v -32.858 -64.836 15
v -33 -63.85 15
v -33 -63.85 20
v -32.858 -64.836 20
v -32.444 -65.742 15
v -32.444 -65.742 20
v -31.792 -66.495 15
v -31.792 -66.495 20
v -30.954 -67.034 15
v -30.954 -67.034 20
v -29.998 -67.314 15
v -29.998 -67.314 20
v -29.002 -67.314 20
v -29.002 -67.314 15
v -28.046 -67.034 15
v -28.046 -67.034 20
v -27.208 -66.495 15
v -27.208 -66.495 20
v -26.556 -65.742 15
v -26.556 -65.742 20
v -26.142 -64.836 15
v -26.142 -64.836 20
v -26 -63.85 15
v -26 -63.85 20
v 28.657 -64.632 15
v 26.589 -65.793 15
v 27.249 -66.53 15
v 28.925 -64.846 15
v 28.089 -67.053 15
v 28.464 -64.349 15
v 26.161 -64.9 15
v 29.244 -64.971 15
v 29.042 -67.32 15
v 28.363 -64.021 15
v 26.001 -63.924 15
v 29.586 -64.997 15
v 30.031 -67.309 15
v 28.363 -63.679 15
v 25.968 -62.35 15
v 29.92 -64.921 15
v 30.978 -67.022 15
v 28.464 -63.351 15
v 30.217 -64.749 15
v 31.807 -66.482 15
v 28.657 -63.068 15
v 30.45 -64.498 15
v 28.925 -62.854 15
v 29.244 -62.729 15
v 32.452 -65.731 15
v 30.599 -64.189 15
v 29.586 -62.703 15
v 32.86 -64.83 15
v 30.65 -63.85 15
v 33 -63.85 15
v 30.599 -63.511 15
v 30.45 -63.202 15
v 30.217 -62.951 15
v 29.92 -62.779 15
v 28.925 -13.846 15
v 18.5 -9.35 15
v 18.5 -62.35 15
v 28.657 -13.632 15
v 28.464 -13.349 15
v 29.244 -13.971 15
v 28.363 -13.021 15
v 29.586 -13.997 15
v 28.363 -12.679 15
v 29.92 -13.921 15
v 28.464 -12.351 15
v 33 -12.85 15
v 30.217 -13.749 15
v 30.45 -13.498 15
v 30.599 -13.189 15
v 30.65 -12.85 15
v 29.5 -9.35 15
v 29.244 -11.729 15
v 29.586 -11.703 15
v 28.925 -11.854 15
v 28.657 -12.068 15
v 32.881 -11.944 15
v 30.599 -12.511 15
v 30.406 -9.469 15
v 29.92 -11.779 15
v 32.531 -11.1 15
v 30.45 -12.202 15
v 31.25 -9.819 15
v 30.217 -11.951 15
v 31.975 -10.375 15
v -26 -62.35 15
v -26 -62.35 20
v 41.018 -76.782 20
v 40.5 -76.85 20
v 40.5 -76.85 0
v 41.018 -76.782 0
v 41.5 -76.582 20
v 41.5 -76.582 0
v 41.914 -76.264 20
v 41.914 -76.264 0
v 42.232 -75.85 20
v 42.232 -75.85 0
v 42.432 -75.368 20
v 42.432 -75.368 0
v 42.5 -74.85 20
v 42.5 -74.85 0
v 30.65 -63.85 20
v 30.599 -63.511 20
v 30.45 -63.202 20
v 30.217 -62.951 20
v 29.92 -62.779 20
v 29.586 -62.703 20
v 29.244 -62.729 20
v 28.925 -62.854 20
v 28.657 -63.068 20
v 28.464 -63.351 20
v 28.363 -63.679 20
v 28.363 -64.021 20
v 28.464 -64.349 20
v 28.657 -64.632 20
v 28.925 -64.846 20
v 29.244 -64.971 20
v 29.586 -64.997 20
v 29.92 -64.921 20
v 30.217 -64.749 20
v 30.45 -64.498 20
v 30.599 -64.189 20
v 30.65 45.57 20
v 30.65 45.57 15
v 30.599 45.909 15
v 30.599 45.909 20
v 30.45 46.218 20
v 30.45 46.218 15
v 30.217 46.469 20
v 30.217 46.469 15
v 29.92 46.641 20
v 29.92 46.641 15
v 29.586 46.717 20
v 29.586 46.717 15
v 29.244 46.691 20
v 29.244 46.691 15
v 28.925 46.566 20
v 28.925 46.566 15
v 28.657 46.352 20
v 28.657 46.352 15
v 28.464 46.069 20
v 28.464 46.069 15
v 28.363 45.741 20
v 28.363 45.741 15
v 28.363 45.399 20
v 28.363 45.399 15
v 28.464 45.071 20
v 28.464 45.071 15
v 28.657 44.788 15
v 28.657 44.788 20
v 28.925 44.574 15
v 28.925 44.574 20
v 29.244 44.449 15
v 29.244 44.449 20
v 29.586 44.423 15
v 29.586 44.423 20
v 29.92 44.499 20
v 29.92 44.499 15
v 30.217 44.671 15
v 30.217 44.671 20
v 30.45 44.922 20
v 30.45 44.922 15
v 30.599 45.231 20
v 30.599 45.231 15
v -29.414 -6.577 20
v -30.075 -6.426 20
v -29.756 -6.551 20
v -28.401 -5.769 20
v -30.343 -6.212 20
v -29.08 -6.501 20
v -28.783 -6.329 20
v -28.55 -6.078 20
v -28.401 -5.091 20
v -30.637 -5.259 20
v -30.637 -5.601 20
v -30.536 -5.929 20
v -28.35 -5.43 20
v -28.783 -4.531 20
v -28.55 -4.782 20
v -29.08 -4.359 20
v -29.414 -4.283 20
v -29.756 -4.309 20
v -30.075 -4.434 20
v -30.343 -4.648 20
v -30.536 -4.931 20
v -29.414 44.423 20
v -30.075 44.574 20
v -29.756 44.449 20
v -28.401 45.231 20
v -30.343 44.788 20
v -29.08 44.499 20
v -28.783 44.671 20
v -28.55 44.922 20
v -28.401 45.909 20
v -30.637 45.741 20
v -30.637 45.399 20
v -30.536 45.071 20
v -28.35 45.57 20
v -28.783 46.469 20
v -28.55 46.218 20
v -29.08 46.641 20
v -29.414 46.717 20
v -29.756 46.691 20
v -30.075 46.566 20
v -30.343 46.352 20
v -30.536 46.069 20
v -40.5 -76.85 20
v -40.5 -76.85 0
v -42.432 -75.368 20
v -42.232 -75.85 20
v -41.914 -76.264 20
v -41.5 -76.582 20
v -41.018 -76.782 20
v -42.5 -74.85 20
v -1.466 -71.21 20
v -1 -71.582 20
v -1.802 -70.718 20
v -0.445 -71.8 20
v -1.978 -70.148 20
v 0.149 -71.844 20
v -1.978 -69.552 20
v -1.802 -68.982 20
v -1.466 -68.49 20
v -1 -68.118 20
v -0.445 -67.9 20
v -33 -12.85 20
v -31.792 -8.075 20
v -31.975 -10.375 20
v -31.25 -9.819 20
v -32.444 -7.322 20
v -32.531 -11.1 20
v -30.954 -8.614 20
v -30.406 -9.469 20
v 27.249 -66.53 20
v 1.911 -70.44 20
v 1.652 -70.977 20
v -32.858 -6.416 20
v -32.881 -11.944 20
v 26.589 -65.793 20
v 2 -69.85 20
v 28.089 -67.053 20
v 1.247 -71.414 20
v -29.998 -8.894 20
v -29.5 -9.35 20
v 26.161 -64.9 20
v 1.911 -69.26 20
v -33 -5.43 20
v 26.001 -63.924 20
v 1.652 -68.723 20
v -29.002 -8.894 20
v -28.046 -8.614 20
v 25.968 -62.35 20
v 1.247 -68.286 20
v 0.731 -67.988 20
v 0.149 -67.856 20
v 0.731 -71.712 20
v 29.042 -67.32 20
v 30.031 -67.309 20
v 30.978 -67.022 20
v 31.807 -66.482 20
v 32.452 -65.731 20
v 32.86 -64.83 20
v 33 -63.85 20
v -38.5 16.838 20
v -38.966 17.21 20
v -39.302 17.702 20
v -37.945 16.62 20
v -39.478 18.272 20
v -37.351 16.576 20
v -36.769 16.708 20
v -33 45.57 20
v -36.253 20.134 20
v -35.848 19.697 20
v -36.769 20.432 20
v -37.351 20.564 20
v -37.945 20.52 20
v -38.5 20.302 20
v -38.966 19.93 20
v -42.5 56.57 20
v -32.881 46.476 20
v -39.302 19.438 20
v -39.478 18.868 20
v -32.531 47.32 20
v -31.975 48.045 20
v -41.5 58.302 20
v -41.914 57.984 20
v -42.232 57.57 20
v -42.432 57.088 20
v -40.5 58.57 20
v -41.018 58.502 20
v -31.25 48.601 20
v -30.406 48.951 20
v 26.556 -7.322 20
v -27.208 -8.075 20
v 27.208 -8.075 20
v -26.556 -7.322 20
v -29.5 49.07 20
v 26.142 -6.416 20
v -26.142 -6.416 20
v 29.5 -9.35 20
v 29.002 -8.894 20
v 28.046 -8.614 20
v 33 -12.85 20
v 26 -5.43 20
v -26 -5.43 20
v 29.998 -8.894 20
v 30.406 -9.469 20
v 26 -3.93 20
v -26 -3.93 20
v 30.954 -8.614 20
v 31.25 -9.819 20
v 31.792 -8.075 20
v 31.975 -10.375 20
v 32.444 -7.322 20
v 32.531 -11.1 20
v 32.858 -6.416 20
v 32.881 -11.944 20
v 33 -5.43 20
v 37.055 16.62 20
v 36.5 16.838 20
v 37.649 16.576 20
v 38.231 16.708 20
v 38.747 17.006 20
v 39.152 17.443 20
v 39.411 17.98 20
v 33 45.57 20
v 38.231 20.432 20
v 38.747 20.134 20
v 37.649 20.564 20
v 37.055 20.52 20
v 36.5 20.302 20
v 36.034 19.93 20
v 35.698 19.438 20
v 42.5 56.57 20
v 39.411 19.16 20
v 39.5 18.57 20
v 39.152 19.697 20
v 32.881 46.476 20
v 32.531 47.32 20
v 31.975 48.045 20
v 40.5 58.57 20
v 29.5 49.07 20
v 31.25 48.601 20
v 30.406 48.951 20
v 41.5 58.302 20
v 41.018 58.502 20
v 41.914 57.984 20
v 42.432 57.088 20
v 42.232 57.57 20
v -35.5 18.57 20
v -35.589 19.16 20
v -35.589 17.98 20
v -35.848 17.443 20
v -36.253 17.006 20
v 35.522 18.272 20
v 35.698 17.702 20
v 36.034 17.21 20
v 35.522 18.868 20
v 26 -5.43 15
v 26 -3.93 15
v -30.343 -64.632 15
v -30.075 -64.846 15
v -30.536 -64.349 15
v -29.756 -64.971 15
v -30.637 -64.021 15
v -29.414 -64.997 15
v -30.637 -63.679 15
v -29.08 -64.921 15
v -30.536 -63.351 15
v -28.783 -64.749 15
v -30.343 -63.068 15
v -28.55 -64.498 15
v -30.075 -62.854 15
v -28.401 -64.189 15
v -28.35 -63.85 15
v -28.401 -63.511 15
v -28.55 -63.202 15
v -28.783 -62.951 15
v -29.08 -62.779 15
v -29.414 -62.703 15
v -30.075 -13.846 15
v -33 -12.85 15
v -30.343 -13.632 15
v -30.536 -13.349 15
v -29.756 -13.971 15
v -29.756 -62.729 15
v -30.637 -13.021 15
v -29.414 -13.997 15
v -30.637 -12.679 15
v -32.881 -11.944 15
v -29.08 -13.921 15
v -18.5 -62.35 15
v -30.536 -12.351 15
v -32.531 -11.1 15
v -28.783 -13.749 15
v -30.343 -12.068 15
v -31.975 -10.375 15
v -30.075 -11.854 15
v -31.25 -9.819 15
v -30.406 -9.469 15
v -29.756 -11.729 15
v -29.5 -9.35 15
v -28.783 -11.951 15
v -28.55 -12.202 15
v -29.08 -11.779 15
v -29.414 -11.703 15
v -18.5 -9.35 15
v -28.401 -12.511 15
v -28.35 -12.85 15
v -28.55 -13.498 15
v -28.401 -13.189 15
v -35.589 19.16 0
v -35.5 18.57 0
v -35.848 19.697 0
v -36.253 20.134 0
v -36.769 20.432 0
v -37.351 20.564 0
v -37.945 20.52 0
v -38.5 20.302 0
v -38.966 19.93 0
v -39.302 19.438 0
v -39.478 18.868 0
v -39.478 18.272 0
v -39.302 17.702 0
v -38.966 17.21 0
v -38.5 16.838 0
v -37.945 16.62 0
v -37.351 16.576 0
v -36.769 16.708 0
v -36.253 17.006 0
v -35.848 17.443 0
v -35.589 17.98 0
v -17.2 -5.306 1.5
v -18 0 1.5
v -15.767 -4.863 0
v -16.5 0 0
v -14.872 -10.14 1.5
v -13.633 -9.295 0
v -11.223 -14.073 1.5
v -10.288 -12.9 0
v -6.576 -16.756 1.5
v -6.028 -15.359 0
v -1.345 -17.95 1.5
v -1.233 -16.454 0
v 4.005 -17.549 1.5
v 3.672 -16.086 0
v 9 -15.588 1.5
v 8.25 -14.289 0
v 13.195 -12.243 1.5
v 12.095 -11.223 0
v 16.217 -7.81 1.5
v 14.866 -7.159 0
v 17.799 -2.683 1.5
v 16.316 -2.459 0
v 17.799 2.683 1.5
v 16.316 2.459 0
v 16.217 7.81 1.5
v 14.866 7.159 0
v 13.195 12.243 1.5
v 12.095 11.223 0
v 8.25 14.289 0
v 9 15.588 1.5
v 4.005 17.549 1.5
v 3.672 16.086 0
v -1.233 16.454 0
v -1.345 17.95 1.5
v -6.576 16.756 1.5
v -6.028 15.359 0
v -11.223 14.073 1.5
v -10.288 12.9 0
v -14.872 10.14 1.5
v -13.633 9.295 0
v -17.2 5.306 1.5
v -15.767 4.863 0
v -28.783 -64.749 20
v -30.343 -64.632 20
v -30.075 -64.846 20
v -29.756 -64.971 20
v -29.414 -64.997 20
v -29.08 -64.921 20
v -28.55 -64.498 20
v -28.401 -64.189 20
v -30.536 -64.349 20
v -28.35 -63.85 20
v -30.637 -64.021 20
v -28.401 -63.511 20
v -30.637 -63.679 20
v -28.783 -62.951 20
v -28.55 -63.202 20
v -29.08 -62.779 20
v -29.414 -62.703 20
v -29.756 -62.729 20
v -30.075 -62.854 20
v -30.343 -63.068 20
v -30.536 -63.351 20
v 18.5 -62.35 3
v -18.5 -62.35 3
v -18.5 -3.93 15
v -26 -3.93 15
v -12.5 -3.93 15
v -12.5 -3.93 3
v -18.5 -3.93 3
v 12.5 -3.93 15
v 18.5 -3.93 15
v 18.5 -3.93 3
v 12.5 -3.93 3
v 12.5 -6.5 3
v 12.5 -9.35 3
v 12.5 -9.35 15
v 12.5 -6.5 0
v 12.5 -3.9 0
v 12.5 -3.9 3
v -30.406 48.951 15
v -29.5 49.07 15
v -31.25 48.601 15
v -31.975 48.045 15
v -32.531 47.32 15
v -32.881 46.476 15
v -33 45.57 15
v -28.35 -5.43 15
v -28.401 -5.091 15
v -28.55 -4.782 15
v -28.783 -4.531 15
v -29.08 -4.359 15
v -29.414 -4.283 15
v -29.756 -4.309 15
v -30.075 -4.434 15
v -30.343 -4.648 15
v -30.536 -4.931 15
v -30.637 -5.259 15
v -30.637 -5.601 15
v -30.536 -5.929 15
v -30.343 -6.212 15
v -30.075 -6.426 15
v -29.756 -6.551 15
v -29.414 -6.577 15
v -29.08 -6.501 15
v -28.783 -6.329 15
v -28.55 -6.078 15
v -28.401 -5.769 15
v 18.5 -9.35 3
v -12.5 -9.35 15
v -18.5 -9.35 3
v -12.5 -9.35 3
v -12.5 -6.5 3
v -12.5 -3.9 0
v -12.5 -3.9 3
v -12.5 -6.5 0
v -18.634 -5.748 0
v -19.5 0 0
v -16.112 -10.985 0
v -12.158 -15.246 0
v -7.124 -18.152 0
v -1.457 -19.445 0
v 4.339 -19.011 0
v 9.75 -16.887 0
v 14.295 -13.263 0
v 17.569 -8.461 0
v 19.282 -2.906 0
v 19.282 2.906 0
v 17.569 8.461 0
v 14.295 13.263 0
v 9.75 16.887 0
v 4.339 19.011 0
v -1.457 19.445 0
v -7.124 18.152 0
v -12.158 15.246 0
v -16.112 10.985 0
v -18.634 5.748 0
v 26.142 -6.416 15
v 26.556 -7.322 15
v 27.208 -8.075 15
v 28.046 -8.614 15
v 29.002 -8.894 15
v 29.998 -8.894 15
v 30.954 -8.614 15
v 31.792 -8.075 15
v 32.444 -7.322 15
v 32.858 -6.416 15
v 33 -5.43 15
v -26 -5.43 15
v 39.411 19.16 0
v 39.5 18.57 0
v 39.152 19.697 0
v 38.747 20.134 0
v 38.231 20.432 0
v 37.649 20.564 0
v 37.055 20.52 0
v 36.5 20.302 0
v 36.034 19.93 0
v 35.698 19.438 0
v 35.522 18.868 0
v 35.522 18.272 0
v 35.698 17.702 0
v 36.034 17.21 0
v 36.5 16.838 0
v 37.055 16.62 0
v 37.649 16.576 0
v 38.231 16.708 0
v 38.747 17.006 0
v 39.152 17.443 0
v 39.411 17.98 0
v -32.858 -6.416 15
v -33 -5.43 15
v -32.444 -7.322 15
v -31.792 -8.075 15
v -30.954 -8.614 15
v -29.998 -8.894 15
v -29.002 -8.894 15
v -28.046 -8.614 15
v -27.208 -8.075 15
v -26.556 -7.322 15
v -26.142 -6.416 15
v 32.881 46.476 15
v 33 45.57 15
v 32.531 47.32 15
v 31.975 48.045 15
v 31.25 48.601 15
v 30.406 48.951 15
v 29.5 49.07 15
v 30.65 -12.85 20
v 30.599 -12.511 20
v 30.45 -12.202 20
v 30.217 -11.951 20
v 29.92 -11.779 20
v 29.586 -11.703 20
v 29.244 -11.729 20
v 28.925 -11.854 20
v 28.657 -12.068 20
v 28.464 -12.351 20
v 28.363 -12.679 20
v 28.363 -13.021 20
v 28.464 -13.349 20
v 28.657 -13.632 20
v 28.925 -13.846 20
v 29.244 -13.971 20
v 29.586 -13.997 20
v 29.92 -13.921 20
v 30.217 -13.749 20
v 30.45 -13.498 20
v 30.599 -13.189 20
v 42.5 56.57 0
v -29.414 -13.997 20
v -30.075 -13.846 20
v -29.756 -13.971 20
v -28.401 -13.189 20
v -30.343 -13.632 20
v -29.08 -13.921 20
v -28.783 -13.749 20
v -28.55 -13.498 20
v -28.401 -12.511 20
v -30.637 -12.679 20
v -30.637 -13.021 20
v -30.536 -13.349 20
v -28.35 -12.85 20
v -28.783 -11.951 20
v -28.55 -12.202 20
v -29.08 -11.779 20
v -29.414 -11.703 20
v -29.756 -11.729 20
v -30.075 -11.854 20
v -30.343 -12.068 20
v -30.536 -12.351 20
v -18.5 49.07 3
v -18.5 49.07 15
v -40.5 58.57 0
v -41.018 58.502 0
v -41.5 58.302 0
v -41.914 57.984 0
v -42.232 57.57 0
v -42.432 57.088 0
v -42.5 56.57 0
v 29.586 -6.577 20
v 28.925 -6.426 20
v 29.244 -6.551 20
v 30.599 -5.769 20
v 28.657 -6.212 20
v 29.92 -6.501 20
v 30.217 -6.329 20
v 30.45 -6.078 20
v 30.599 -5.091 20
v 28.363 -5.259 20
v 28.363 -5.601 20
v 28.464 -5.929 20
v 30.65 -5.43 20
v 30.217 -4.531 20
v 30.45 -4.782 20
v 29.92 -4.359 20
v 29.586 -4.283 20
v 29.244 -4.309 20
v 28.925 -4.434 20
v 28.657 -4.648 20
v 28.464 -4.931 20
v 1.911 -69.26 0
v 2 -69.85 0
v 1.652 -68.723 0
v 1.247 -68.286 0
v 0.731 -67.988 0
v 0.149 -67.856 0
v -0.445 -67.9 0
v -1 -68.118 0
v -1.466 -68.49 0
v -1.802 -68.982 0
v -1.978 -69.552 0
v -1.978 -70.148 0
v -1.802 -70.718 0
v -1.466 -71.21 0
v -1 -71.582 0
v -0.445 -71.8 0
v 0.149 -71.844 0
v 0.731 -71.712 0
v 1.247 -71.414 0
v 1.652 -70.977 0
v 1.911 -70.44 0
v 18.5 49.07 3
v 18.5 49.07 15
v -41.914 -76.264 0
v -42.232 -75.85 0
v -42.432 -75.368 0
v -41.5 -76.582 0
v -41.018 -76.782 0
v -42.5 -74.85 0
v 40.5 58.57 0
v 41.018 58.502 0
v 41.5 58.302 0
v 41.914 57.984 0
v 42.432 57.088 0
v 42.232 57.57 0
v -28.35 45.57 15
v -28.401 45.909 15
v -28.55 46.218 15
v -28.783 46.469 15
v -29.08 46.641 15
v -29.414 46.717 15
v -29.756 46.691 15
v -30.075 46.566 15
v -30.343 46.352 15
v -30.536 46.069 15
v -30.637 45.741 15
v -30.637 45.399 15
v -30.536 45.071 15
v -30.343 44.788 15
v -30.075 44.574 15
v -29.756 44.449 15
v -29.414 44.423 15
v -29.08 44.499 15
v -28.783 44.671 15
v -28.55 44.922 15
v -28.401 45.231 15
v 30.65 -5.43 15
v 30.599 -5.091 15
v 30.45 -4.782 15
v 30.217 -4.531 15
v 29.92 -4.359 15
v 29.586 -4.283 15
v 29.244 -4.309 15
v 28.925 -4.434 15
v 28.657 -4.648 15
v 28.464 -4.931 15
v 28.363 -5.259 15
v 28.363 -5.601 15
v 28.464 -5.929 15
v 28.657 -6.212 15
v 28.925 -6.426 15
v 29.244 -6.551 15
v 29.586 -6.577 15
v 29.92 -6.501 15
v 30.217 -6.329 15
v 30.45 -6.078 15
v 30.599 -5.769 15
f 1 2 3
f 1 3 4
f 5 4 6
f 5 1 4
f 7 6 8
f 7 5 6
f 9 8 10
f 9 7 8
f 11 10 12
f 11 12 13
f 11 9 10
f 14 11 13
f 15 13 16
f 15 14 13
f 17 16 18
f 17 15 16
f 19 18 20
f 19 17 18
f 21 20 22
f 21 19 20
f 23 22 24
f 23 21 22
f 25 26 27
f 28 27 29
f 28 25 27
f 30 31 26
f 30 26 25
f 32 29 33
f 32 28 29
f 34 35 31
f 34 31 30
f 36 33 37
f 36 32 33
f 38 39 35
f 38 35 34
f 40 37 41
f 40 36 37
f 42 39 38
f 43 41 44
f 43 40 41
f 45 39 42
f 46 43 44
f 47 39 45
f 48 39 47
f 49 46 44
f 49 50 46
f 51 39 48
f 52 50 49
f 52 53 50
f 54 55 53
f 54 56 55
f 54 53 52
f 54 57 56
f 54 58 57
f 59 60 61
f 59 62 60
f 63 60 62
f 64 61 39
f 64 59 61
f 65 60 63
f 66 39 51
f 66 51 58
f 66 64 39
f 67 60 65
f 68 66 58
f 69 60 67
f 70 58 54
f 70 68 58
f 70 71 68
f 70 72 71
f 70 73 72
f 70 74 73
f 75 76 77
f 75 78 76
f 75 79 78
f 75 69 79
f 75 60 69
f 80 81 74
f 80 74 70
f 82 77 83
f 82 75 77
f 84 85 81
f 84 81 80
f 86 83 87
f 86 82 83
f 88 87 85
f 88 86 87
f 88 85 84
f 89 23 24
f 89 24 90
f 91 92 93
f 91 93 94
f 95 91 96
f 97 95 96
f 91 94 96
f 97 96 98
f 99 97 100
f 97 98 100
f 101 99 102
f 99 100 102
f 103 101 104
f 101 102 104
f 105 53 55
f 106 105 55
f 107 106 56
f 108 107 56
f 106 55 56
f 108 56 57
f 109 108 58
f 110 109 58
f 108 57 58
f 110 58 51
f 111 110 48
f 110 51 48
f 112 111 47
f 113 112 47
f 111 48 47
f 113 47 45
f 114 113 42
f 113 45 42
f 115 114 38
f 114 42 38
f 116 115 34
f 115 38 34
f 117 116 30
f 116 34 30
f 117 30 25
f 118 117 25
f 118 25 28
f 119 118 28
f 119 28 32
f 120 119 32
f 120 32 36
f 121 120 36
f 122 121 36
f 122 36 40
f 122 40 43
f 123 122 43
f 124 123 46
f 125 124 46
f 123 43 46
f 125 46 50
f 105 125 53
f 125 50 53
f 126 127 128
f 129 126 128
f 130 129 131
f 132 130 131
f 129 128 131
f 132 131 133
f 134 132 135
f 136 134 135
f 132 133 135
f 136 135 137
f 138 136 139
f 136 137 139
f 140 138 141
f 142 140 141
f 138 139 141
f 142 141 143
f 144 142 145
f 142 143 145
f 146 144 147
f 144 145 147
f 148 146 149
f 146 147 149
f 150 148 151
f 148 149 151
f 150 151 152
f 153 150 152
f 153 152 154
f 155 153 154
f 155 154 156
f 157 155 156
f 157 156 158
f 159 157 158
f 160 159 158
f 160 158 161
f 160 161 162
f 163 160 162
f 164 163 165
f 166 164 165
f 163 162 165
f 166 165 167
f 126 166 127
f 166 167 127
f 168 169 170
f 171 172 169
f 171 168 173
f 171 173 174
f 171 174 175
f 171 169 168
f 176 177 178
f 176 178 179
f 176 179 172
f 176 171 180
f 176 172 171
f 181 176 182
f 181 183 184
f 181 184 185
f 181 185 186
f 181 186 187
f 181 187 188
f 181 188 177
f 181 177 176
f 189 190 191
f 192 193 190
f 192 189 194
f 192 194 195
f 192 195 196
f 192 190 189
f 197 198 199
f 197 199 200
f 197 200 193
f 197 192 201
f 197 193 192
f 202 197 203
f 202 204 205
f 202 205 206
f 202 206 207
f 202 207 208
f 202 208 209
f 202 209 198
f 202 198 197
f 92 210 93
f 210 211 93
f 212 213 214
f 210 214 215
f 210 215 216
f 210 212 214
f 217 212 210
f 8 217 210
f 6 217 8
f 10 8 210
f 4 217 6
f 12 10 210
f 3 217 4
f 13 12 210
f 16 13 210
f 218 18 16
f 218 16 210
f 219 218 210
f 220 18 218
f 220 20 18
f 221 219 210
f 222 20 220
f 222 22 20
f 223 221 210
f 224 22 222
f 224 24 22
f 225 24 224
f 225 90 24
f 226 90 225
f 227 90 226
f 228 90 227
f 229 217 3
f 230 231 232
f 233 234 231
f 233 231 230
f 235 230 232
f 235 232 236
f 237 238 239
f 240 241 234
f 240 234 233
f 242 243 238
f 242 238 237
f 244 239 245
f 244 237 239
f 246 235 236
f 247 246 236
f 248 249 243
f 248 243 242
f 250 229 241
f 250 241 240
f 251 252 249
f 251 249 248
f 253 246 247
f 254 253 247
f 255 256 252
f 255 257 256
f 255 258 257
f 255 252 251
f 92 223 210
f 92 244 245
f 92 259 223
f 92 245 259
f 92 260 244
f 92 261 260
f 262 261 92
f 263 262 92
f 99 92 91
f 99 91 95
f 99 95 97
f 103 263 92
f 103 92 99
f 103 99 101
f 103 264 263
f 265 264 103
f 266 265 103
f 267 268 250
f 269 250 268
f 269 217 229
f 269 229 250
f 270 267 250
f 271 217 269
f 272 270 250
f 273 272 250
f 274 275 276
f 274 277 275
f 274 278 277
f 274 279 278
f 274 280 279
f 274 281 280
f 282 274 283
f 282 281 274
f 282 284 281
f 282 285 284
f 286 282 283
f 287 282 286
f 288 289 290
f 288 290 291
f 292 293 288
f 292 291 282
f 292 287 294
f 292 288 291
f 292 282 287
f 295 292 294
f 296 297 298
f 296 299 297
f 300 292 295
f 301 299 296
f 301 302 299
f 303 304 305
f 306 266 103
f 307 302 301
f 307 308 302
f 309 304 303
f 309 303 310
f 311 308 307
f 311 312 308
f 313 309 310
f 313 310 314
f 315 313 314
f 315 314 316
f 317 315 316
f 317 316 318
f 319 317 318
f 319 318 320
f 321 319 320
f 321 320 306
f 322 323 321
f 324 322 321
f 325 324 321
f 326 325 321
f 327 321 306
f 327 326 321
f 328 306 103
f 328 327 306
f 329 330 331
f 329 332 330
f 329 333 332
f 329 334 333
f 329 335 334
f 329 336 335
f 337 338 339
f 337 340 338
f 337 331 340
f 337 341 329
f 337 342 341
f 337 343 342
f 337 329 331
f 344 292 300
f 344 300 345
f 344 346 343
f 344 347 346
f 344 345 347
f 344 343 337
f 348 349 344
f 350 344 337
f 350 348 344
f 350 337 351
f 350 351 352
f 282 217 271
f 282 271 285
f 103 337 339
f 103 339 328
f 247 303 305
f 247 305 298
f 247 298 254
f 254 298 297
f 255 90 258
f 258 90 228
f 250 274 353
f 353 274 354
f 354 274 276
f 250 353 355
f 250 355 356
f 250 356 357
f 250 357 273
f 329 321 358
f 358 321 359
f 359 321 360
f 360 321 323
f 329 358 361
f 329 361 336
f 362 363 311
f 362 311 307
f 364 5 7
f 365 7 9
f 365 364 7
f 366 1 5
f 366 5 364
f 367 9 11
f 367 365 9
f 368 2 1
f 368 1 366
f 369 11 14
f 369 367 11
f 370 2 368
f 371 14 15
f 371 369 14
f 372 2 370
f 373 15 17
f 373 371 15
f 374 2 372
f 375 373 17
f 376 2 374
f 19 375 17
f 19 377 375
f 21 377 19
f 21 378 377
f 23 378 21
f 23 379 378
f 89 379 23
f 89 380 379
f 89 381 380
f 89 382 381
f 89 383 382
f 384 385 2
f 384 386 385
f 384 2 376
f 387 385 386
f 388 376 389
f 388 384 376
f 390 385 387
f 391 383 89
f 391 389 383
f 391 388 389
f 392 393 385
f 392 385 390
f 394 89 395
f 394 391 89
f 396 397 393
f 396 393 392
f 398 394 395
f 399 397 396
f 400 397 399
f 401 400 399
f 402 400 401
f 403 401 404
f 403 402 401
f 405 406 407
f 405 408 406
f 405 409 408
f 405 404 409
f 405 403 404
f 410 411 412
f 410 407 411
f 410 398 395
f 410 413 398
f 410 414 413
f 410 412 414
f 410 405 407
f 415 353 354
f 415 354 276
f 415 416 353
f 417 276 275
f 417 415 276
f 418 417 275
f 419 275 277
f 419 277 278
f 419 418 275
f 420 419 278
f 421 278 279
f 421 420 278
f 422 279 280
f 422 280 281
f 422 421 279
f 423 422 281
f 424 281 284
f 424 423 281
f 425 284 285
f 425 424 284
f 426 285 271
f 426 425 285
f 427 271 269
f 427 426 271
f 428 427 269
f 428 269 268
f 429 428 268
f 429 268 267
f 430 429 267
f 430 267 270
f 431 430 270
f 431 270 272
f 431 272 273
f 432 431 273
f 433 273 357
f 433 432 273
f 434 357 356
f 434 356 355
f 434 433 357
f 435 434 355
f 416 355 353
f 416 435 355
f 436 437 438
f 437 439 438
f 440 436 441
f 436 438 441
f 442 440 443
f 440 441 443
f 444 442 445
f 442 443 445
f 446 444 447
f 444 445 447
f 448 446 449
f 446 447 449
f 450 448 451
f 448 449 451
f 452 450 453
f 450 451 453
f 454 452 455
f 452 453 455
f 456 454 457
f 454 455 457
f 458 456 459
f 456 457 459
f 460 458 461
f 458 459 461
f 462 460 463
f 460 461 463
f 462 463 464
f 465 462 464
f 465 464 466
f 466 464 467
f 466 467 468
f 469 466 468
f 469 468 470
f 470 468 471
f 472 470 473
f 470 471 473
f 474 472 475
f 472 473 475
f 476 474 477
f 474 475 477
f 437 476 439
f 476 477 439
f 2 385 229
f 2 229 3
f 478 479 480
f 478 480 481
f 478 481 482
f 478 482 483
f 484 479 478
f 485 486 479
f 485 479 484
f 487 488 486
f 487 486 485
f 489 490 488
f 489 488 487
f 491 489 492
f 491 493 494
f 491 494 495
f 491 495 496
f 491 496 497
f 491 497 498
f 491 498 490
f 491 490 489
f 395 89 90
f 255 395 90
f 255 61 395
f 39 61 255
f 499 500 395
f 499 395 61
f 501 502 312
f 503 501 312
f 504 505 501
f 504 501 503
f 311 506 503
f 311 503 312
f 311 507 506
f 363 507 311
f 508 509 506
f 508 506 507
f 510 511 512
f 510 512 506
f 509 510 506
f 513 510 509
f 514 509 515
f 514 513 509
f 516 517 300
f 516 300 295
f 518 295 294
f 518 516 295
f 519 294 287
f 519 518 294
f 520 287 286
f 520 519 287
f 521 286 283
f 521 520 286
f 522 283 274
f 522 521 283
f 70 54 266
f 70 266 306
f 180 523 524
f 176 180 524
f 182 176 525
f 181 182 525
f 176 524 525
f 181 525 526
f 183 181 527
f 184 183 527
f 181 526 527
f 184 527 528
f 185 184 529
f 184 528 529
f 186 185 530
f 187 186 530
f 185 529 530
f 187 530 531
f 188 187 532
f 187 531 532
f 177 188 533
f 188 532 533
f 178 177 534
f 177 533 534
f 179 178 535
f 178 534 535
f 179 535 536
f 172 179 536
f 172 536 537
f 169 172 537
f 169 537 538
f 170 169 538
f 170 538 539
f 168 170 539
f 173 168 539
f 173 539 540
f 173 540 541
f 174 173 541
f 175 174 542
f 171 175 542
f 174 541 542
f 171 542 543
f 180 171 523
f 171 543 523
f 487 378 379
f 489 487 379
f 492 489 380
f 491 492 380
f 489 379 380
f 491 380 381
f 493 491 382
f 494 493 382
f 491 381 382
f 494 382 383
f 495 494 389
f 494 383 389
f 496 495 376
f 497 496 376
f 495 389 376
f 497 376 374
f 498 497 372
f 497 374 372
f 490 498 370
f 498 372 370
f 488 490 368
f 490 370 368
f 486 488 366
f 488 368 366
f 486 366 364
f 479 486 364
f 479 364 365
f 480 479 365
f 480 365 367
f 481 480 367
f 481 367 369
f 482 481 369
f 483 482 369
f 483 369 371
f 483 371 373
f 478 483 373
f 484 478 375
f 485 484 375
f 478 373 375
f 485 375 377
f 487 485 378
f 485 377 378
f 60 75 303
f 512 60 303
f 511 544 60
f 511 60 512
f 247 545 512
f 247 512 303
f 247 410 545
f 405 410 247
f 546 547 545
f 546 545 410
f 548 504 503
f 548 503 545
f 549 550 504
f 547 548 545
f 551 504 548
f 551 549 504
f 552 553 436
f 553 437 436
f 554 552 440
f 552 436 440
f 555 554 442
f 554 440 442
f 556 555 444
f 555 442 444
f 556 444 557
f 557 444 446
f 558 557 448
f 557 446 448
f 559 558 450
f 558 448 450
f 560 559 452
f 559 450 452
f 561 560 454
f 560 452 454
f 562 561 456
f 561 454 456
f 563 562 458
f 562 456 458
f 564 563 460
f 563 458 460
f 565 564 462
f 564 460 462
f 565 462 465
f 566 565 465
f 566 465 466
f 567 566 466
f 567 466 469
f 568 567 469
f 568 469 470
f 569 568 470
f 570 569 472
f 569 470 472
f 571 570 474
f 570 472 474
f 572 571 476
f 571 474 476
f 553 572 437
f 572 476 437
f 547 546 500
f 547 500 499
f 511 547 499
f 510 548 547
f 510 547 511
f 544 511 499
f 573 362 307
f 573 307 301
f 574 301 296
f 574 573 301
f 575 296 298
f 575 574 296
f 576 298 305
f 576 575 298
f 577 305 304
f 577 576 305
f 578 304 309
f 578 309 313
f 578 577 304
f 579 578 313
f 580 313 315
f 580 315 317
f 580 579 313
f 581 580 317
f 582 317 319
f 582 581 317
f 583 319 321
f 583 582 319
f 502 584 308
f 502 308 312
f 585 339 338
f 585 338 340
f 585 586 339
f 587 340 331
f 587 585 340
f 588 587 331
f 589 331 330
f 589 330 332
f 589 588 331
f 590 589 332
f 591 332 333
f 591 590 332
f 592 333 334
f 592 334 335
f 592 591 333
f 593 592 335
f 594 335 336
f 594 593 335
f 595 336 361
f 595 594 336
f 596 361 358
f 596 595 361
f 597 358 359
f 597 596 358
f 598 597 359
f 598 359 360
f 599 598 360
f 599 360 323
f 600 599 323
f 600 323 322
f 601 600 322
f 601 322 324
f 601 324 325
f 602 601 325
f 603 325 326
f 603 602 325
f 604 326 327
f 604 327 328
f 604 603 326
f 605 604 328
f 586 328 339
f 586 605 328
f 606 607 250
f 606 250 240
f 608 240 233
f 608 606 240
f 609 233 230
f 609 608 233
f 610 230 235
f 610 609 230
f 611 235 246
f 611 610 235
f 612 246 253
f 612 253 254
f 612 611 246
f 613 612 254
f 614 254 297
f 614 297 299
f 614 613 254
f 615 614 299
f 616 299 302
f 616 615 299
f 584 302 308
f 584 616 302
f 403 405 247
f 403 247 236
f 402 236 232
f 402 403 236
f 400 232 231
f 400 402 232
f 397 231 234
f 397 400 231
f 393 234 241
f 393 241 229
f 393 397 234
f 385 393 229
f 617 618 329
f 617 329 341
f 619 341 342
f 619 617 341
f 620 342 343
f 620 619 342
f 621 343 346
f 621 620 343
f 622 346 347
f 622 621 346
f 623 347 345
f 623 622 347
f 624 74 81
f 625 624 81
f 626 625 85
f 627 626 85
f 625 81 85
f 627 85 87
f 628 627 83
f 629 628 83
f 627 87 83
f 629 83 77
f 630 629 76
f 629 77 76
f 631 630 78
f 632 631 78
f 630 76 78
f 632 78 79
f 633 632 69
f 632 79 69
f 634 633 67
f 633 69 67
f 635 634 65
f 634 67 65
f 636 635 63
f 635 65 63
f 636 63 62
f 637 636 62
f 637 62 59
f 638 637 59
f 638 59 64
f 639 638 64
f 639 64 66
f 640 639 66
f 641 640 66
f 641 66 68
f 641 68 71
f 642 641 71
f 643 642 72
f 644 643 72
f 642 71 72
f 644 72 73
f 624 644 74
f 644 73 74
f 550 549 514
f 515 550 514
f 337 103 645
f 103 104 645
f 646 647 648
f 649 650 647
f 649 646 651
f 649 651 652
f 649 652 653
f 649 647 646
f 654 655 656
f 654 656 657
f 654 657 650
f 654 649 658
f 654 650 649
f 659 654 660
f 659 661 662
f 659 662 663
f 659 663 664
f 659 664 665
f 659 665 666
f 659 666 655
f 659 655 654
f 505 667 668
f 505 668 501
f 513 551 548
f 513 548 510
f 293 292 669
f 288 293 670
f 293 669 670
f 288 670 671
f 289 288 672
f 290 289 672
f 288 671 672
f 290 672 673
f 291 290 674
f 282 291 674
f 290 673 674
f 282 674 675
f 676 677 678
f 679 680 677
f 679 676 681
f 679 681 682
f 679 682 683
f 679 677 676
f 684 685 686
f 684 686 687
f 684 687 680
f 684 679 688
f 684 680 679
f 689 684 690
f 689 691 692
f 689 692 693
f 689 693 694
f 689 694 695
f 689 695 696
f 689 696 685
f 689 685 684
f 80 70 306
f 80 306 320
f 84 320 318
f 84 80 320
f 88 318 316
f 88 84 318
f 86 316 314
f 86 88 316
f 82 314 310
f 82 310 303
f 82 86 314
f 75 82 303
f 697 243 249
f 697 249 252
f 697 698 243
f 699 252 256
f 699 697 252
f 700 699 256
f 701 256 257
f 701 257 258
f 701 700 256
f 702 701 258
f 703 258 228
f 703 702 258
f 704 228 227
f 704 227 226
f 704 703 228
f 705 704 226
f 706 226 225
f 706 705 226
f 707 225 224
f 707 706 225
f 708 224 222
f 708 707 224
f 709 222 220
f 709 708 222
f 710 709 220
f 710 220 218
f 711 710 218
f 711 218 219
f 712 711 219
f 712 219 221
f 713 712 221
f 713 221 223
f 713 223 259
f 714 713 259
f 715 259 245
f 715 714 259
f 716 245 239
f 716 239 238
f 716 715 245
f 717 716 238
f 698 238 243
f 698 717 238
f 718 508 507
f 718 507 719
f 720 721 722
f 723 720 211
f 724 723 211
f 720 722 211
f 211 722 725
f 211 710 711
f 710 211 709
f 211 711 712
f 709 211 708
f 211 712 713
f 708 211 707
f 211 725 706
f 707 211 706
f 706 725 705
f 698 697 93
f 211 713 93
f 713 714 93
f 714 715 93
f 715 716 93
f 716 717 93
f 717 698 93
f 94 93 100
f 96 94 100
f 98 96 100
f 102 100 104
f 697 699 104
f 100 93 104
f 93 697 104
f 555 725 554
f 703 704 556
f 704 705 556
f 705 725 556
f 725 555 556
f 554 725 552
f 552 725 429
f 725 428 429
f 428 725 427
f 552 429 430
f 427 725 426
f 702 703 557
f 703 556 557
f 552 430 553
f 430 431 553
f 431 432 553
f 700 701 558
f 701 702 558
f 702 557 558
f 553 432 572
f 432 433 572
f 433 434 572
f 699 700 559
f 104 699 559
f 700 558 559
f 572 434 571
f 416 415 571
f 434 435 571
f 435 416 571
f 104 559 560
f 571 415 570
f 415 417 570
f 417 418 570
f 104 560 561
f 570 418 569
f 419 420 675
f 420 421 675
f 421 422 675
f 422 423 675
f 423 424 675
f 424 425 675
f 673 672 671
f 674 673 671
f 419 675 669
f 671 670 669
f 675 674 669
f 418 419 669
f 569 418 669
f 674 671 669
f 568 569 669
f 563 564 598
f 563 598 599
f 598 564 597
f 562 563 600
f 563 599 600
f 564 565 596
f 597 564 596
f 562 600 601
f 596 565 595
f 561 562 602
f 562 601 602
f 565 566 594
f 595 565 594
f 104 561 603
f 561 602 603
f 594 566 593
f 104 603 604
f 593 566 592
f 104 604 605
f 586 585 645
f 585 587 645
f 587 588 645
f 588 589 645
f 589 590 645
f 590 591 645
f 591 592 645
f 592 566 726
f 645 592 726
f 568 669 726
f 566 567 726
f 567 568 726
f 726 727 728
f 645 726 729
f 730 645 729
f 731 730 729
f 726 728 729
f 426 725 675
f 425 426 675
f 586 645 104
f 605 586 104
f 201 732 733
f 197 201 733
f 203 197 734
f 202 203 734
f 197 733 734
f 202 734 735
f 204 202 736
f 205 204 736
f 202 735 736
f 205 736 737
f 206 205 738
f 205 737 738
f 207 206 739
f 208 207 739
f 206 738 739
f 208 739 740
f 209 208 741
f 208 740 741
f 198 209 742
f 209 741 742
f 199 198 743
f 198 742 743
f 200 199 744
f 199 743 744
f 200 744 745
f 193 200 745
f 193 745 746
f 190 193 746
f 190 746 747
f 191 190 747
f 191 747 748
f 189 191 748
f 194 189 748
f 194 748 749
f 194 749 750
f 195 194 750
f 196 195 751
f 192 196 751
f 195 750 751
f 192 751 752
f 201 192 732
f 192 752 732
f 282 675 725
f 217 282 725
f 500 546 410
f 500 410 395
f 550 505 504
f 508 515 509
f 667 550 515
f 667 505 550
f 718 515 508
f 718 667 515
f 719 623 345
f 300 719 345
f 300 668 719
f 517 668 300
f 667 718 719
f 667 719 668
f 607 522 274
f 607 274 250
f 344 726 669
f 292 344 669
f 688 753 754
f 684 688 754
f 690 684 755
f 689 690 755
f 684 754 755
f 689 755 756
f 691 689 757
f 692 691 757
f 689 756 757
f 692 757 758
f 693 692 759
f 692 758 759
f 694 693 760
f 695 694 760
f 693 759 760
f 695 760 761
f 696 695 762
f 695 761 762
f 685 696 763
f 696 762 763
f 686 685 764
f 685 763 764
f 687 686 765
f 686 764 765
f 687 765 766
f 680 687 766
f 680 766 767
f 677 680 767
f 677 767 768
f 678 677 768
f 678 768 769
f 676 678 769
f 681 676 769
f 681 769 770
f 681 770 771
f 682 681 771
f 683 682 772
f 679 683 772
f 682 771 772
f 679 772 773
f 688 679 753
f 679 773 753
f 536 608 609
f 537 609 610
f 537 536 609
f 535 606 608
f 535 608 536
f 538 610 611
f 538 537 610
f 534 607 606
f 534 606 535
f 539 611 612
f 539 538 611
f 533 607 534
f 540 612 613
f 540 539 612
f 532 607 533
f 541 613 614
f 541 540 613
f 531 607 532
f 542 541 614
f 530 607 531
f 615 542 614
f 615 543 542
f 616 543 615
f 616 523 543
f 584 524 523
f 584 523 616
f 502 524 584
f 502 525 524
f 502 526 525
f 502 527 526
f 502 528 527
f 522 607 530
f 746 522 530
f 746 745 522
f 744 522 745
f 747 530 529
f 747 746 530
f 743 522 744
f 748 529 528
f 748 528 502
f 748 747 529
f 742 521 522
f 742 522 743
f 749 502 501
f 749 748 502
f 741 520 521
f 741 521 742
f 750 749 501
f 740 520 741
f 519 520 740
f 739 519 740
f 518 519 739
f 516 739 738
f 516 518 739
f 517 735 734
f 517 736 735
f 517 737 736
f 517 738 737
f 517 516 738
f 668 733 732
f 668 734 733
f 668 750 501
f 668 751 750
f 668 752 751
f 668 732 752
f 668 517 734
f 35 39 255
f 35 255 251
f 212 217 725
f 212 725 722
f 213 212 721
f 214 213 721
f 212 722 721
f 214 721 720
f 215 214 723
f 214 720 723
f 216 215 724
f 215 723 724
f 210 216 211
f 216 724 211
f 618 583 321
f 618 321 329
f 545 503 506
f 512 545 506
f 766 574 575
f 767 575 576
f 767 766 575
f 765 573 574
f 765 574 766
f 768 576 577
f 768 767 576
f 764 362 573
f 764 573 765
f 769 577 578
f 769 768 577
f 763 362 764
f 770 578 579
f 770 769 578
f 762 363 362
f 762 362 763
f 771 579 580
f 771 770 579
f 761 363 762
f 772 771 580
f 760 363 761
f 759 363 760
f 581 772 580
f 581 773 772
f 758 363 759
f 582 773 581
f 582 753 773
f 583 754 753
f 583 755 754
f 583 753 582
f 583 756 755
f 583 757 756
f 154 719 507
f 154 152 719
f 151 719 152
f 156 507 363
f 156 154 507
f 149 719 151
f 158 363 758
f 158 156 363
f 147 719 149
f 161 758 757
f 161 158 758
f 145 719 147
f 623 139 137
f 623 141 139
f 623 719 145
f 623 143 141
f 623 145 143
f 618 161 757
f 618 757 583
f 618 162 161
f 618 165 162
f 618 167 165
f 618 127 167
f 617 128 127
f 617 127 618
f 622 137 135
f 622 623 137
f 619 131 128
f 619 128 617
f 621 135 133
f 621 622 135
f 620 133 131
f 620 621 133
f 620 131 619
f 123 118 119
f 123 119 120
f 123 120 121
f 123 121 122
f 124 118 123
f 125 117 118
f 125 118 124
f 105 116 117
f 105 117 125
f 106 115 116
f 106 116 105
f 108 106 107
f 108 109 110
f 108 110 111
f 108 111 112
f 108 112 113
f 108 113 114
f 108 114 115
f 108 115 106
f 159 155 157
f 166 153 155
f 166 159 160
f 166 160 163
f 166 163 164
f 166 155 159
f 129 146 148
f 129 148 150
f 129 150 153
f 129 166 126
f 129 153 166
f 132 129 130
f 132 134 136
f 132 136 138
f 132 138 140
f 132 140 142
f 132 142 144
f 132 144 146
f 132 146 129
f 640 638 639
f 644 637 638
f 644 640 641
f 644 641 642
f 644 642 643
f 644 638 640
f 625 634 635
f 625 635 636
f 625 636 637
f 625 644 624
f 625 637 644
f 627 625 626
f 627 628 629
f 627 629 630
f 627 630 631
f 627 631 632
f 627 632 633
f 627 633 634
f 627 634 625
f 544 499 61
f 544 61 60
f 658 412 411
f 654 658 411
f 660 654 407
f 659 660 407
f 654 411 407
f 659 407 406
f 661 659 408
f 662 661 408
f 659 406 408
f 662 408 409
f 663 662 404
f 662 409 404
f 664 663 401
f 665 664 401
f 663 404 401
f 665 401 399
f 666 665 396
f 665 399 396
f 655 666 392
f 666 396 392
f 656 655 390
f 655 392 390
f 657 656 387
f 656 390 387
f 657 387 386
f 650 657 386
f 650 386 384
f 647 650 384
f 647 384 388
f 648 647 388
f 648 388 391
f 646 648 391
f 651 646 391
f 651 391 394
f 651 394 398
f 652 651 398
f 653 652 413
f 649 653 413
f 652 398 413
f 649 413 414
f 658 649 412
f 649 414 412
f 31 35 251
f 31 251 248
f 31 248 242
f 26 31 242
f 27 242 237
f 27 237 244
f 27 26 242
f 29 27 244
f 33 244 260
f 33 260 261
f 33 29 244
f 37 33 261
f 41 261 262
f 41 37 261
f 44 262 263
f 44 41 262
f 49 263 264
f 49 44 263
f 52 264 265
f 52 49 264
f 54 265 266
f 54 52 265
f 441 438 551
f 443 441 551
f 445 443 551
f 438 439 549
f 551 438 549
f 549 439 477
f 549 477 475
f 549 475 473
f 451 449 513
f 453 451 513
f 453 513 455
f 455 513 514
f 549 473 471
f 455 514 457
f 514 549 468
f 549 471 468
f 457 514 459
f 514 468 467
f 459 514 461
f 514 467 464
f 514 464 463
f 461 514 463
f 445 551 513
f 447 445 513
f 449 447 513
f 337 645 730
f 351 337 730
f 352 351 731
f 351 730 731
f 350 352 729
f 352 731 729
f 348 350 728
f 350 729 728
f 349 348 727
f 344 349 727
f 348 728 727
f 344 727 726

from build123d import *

# Parameters (mm, degrees)
SKETCH_R      = 2
SKETCH_W      = 25
SKETCH_H      = 2.6
PAD_DEPTH     = 3
SKETCH002_R   = 2
PAD001_DEPTH  = 12
SKETCH003_R   = 2
SKETCH003_R_2 = 1.15
PAD002_DEPTH  = 5


with BuildPart() as part:
    # Sketch → Pad (new body)
    with BuildSketch(Plane.XY):
        with BuildLine():
            Line((-42.5, 56.57), (-42.5, -74.85))
            ThreePointArc((-42.5, -74.85), (-41.914214, -76.264214), (-40.5, -76.85))
            Line((-40.5, -76.85), (40.5, -76.85))
            ThreePointArc((40.5, -76.85), (41.914214, -76.264214), (42.5, -74.85))
            Line((42.5, -74.85), (42.5, 56.57))
            ThreePointArc((42.5, 56.57), (41.914214, 57.984214), (40.5, 58.57))
            Line((40.5, 58.57), (-40.5, 58.57))
            ThreePointArc((-40.5, 58.57), (-41.914214, 57.984214), (-42.5, 56.57))
        make_face()
        with Locations((0, -69.85)):
            Circle(SKETCH_R, mode=Mode.SUBTRACT)
        with Locations((37.5, 18.57)):
            Circle(SKETCH_R, mode=Mode.SUBTRACT)
        with Locations((-37.5, 18.57)):
            Circle(SKETCH_R, mode=Mode.SUBTRACT)
        with Locations((0, -5.2)):
            Rectangle(SKETCH_W, SKETCH_H, mode=Mode.SUBTRACT)
    extrude(amount=PAD_DEPTH)

    # Sketch001 → Groove (revolve, cut)
    with BuildSketch(Plane.XZ):
        Polygon((-19.5, 0), (-18, 1.5), (-16.5, 0), align=None)
    revolve(axis=Axis((0, 0, 0), (0, 0, 1)), mode=Mode.SUBTRACT)

    # Sketch002 (on Face5 of Groove) → Pad001 (join)
    with BuildSketch(Plane.XY.offset(3)):
        with BuildLine():
            Line((-42.5, 56.57), (-42.5, -74.85))
            ThreePointArc((-42.5, -74.85), (-41.914214, -76.264214), (-40.5, -76.85))
            Line((-40.5, -76.85), (40.5, -76.85))
            ThreePointArc((40.5, -76.85), (41.914214, -76.264214), (42.5, -74.85))
            Line((42.5, -74.85), (42.5, 56.57))
            ThreePointArc((42.5, 56.57), (41.914214, 57.984214), (40.5, 58.57))
            Line((40.5, 58.57), (-40.5, 58.57))
            ThreePointArc((-40.5, 58.57), (-41.914214, 57.984214), (-42.5, 56.57))
        make_face()
        with Locations((-37.5, 18.57)):
            Circle(SKETCH002_R, mode=Mode.SUBTRACT)
        with Locations((37.5, 18.57)):
            Circle(SKETCH002_R, mode=Mode.SUBTRACT)
        with Locations((0, -69.85)):
            Circle(SKETCH002_R, mode=Mode.SUBTRACT)
        Polygon((-18.5, -62.35), (18.5, -62.35), (18.5, -9.35), (12.5, -9.35), (12.5, -3.93), (18.5, -3.93), (18.5, 49.07), (-18.5, 49.07), (-18.5, -3.93), (-12.5, -3.93), (-12.5, -9.35), (-18.5, -9.35), align=None, mode=Mode.SUBTRACT)
    extrude(amount=PAD001_DEPTH)

    # Sketch003 (on Face17 of Pad001) → Pad002 (join)
    with BuildSketch(Plane.XY.offset(15)):
        with BuildLine():
            Line((-42.5, 56.57), (-42.5, -74.85))
            ThreePointArc((-42.5, -74.85), (-41.914214, -76.264214), (-40.5, -76.85))
            Line((-40.5, -76.85), (40.5, -76.85))
            ThreePointArc((40.5, -76.85), (41.914214, -76.264214), (42.5, -74.85))
            Line((42.5, -74.85), (42.5, 56.57))
            ThreePointArc((42.5, 56.57), (41.914214, 57.984214), (40.5, 58.57))
            Line((40.5, 58.57), (-40.5, 58.57))
            ThreePointArc((-40.5, 58.57), (-41.914214, 57.984214), (-42.5, 56.57))
        make_face()
        with Locations((-37.5, 18.57)):
            Circle(SKETCH003_R, mode=Mode.SUBTRACT)
        with Locations((37.5, 18.57)):
            Circle(SKETCH003_R, mode=Mode.SUBTRACT)
        with Locations((0, -69.85)):
            Circle(SKETCH003_R, mode=Mode.SUBTRACT)
        with BuildLine():
            Line((-33, 45.57), (-33, -5.43))
            ThreePointArc((-33, -5.43), (-29.5, -8.93), (-26, -5.43))
            Line((-26, -5.43), (-26, -3.93))
            Line((-26, -3.93), (26, -3.93))
            Line((26, -3.93), (26, -5.43))
            ThreePointArc((26, -5.43), (29.5, -8.93), (33, -5.43))
            Line((33, -5.43), (33, 45.57))
            ThreePointArc((33, 45.57), (31.974874, 48.044874), (29.5, 49.07))
            Line((29.5, 49.07), (-29.5, 49.07))
            ThreePointArc((-29.5, 49.07), (-31.974874, 48.044874), (-33, 45.57))
        make_face(mode=Mode.SUBTRACT)
        with BuildLine():
            Line((-33, -12.85), (-33, -63.85))
            ThreePointArc((-33, -63.85), (-29.5, -67.35), (-26, -63.85))
            Line((-26, -63.85), (-26, -62.35))
            Line((-26, -62.35), (25.967625, -62.35))
            Line((25.967625, -62.35), (26.000776, -63.923713))
            ThreePointArc((26.000776, -63.923713), (29.536859, -67.349806), (33, -63.85))
            Line((33, -63.85), (33, -12.85))
            ThreePointArc((33, -12.85), (31.974874, -10.375126), (29.5, -9.35))
            Line((29.5, -9.35), (-29.5, -9.35))
            ThreePointArc((-29.5, -9.35), (-31.974874, -10.375126), (-33, -12.85))
        make_face(mode=Mode.SUBTRACT)
        with Locations((-29.5, 45.57)):
            Circle(SKETCH003_R_2)
        with Locations((29.5, 45.57)):
            Circle(SKETCH003_R_2)
        with Locations((-29.5, -5.43)):
            Circle(SKETCH003_R_2)
        with Locations((29.5, -12.85)):
            Circle(SKETCH003_R_2)
        with Locations((29.5, -63.85)):
            Circle(SKETCH003_R_2)
        with Locations((-29.5, -63.85)):
            Circle(SKETCH003_R_2)
        with Locations((-29.5, -12.85)):
            Circle(SKETCH003_R_2)
        with Locations((29.5, -5.43)):
            Circle(SKETCH003_R_2)
    extrude(amount=PAD002_DEPTH)


solid = part.part
